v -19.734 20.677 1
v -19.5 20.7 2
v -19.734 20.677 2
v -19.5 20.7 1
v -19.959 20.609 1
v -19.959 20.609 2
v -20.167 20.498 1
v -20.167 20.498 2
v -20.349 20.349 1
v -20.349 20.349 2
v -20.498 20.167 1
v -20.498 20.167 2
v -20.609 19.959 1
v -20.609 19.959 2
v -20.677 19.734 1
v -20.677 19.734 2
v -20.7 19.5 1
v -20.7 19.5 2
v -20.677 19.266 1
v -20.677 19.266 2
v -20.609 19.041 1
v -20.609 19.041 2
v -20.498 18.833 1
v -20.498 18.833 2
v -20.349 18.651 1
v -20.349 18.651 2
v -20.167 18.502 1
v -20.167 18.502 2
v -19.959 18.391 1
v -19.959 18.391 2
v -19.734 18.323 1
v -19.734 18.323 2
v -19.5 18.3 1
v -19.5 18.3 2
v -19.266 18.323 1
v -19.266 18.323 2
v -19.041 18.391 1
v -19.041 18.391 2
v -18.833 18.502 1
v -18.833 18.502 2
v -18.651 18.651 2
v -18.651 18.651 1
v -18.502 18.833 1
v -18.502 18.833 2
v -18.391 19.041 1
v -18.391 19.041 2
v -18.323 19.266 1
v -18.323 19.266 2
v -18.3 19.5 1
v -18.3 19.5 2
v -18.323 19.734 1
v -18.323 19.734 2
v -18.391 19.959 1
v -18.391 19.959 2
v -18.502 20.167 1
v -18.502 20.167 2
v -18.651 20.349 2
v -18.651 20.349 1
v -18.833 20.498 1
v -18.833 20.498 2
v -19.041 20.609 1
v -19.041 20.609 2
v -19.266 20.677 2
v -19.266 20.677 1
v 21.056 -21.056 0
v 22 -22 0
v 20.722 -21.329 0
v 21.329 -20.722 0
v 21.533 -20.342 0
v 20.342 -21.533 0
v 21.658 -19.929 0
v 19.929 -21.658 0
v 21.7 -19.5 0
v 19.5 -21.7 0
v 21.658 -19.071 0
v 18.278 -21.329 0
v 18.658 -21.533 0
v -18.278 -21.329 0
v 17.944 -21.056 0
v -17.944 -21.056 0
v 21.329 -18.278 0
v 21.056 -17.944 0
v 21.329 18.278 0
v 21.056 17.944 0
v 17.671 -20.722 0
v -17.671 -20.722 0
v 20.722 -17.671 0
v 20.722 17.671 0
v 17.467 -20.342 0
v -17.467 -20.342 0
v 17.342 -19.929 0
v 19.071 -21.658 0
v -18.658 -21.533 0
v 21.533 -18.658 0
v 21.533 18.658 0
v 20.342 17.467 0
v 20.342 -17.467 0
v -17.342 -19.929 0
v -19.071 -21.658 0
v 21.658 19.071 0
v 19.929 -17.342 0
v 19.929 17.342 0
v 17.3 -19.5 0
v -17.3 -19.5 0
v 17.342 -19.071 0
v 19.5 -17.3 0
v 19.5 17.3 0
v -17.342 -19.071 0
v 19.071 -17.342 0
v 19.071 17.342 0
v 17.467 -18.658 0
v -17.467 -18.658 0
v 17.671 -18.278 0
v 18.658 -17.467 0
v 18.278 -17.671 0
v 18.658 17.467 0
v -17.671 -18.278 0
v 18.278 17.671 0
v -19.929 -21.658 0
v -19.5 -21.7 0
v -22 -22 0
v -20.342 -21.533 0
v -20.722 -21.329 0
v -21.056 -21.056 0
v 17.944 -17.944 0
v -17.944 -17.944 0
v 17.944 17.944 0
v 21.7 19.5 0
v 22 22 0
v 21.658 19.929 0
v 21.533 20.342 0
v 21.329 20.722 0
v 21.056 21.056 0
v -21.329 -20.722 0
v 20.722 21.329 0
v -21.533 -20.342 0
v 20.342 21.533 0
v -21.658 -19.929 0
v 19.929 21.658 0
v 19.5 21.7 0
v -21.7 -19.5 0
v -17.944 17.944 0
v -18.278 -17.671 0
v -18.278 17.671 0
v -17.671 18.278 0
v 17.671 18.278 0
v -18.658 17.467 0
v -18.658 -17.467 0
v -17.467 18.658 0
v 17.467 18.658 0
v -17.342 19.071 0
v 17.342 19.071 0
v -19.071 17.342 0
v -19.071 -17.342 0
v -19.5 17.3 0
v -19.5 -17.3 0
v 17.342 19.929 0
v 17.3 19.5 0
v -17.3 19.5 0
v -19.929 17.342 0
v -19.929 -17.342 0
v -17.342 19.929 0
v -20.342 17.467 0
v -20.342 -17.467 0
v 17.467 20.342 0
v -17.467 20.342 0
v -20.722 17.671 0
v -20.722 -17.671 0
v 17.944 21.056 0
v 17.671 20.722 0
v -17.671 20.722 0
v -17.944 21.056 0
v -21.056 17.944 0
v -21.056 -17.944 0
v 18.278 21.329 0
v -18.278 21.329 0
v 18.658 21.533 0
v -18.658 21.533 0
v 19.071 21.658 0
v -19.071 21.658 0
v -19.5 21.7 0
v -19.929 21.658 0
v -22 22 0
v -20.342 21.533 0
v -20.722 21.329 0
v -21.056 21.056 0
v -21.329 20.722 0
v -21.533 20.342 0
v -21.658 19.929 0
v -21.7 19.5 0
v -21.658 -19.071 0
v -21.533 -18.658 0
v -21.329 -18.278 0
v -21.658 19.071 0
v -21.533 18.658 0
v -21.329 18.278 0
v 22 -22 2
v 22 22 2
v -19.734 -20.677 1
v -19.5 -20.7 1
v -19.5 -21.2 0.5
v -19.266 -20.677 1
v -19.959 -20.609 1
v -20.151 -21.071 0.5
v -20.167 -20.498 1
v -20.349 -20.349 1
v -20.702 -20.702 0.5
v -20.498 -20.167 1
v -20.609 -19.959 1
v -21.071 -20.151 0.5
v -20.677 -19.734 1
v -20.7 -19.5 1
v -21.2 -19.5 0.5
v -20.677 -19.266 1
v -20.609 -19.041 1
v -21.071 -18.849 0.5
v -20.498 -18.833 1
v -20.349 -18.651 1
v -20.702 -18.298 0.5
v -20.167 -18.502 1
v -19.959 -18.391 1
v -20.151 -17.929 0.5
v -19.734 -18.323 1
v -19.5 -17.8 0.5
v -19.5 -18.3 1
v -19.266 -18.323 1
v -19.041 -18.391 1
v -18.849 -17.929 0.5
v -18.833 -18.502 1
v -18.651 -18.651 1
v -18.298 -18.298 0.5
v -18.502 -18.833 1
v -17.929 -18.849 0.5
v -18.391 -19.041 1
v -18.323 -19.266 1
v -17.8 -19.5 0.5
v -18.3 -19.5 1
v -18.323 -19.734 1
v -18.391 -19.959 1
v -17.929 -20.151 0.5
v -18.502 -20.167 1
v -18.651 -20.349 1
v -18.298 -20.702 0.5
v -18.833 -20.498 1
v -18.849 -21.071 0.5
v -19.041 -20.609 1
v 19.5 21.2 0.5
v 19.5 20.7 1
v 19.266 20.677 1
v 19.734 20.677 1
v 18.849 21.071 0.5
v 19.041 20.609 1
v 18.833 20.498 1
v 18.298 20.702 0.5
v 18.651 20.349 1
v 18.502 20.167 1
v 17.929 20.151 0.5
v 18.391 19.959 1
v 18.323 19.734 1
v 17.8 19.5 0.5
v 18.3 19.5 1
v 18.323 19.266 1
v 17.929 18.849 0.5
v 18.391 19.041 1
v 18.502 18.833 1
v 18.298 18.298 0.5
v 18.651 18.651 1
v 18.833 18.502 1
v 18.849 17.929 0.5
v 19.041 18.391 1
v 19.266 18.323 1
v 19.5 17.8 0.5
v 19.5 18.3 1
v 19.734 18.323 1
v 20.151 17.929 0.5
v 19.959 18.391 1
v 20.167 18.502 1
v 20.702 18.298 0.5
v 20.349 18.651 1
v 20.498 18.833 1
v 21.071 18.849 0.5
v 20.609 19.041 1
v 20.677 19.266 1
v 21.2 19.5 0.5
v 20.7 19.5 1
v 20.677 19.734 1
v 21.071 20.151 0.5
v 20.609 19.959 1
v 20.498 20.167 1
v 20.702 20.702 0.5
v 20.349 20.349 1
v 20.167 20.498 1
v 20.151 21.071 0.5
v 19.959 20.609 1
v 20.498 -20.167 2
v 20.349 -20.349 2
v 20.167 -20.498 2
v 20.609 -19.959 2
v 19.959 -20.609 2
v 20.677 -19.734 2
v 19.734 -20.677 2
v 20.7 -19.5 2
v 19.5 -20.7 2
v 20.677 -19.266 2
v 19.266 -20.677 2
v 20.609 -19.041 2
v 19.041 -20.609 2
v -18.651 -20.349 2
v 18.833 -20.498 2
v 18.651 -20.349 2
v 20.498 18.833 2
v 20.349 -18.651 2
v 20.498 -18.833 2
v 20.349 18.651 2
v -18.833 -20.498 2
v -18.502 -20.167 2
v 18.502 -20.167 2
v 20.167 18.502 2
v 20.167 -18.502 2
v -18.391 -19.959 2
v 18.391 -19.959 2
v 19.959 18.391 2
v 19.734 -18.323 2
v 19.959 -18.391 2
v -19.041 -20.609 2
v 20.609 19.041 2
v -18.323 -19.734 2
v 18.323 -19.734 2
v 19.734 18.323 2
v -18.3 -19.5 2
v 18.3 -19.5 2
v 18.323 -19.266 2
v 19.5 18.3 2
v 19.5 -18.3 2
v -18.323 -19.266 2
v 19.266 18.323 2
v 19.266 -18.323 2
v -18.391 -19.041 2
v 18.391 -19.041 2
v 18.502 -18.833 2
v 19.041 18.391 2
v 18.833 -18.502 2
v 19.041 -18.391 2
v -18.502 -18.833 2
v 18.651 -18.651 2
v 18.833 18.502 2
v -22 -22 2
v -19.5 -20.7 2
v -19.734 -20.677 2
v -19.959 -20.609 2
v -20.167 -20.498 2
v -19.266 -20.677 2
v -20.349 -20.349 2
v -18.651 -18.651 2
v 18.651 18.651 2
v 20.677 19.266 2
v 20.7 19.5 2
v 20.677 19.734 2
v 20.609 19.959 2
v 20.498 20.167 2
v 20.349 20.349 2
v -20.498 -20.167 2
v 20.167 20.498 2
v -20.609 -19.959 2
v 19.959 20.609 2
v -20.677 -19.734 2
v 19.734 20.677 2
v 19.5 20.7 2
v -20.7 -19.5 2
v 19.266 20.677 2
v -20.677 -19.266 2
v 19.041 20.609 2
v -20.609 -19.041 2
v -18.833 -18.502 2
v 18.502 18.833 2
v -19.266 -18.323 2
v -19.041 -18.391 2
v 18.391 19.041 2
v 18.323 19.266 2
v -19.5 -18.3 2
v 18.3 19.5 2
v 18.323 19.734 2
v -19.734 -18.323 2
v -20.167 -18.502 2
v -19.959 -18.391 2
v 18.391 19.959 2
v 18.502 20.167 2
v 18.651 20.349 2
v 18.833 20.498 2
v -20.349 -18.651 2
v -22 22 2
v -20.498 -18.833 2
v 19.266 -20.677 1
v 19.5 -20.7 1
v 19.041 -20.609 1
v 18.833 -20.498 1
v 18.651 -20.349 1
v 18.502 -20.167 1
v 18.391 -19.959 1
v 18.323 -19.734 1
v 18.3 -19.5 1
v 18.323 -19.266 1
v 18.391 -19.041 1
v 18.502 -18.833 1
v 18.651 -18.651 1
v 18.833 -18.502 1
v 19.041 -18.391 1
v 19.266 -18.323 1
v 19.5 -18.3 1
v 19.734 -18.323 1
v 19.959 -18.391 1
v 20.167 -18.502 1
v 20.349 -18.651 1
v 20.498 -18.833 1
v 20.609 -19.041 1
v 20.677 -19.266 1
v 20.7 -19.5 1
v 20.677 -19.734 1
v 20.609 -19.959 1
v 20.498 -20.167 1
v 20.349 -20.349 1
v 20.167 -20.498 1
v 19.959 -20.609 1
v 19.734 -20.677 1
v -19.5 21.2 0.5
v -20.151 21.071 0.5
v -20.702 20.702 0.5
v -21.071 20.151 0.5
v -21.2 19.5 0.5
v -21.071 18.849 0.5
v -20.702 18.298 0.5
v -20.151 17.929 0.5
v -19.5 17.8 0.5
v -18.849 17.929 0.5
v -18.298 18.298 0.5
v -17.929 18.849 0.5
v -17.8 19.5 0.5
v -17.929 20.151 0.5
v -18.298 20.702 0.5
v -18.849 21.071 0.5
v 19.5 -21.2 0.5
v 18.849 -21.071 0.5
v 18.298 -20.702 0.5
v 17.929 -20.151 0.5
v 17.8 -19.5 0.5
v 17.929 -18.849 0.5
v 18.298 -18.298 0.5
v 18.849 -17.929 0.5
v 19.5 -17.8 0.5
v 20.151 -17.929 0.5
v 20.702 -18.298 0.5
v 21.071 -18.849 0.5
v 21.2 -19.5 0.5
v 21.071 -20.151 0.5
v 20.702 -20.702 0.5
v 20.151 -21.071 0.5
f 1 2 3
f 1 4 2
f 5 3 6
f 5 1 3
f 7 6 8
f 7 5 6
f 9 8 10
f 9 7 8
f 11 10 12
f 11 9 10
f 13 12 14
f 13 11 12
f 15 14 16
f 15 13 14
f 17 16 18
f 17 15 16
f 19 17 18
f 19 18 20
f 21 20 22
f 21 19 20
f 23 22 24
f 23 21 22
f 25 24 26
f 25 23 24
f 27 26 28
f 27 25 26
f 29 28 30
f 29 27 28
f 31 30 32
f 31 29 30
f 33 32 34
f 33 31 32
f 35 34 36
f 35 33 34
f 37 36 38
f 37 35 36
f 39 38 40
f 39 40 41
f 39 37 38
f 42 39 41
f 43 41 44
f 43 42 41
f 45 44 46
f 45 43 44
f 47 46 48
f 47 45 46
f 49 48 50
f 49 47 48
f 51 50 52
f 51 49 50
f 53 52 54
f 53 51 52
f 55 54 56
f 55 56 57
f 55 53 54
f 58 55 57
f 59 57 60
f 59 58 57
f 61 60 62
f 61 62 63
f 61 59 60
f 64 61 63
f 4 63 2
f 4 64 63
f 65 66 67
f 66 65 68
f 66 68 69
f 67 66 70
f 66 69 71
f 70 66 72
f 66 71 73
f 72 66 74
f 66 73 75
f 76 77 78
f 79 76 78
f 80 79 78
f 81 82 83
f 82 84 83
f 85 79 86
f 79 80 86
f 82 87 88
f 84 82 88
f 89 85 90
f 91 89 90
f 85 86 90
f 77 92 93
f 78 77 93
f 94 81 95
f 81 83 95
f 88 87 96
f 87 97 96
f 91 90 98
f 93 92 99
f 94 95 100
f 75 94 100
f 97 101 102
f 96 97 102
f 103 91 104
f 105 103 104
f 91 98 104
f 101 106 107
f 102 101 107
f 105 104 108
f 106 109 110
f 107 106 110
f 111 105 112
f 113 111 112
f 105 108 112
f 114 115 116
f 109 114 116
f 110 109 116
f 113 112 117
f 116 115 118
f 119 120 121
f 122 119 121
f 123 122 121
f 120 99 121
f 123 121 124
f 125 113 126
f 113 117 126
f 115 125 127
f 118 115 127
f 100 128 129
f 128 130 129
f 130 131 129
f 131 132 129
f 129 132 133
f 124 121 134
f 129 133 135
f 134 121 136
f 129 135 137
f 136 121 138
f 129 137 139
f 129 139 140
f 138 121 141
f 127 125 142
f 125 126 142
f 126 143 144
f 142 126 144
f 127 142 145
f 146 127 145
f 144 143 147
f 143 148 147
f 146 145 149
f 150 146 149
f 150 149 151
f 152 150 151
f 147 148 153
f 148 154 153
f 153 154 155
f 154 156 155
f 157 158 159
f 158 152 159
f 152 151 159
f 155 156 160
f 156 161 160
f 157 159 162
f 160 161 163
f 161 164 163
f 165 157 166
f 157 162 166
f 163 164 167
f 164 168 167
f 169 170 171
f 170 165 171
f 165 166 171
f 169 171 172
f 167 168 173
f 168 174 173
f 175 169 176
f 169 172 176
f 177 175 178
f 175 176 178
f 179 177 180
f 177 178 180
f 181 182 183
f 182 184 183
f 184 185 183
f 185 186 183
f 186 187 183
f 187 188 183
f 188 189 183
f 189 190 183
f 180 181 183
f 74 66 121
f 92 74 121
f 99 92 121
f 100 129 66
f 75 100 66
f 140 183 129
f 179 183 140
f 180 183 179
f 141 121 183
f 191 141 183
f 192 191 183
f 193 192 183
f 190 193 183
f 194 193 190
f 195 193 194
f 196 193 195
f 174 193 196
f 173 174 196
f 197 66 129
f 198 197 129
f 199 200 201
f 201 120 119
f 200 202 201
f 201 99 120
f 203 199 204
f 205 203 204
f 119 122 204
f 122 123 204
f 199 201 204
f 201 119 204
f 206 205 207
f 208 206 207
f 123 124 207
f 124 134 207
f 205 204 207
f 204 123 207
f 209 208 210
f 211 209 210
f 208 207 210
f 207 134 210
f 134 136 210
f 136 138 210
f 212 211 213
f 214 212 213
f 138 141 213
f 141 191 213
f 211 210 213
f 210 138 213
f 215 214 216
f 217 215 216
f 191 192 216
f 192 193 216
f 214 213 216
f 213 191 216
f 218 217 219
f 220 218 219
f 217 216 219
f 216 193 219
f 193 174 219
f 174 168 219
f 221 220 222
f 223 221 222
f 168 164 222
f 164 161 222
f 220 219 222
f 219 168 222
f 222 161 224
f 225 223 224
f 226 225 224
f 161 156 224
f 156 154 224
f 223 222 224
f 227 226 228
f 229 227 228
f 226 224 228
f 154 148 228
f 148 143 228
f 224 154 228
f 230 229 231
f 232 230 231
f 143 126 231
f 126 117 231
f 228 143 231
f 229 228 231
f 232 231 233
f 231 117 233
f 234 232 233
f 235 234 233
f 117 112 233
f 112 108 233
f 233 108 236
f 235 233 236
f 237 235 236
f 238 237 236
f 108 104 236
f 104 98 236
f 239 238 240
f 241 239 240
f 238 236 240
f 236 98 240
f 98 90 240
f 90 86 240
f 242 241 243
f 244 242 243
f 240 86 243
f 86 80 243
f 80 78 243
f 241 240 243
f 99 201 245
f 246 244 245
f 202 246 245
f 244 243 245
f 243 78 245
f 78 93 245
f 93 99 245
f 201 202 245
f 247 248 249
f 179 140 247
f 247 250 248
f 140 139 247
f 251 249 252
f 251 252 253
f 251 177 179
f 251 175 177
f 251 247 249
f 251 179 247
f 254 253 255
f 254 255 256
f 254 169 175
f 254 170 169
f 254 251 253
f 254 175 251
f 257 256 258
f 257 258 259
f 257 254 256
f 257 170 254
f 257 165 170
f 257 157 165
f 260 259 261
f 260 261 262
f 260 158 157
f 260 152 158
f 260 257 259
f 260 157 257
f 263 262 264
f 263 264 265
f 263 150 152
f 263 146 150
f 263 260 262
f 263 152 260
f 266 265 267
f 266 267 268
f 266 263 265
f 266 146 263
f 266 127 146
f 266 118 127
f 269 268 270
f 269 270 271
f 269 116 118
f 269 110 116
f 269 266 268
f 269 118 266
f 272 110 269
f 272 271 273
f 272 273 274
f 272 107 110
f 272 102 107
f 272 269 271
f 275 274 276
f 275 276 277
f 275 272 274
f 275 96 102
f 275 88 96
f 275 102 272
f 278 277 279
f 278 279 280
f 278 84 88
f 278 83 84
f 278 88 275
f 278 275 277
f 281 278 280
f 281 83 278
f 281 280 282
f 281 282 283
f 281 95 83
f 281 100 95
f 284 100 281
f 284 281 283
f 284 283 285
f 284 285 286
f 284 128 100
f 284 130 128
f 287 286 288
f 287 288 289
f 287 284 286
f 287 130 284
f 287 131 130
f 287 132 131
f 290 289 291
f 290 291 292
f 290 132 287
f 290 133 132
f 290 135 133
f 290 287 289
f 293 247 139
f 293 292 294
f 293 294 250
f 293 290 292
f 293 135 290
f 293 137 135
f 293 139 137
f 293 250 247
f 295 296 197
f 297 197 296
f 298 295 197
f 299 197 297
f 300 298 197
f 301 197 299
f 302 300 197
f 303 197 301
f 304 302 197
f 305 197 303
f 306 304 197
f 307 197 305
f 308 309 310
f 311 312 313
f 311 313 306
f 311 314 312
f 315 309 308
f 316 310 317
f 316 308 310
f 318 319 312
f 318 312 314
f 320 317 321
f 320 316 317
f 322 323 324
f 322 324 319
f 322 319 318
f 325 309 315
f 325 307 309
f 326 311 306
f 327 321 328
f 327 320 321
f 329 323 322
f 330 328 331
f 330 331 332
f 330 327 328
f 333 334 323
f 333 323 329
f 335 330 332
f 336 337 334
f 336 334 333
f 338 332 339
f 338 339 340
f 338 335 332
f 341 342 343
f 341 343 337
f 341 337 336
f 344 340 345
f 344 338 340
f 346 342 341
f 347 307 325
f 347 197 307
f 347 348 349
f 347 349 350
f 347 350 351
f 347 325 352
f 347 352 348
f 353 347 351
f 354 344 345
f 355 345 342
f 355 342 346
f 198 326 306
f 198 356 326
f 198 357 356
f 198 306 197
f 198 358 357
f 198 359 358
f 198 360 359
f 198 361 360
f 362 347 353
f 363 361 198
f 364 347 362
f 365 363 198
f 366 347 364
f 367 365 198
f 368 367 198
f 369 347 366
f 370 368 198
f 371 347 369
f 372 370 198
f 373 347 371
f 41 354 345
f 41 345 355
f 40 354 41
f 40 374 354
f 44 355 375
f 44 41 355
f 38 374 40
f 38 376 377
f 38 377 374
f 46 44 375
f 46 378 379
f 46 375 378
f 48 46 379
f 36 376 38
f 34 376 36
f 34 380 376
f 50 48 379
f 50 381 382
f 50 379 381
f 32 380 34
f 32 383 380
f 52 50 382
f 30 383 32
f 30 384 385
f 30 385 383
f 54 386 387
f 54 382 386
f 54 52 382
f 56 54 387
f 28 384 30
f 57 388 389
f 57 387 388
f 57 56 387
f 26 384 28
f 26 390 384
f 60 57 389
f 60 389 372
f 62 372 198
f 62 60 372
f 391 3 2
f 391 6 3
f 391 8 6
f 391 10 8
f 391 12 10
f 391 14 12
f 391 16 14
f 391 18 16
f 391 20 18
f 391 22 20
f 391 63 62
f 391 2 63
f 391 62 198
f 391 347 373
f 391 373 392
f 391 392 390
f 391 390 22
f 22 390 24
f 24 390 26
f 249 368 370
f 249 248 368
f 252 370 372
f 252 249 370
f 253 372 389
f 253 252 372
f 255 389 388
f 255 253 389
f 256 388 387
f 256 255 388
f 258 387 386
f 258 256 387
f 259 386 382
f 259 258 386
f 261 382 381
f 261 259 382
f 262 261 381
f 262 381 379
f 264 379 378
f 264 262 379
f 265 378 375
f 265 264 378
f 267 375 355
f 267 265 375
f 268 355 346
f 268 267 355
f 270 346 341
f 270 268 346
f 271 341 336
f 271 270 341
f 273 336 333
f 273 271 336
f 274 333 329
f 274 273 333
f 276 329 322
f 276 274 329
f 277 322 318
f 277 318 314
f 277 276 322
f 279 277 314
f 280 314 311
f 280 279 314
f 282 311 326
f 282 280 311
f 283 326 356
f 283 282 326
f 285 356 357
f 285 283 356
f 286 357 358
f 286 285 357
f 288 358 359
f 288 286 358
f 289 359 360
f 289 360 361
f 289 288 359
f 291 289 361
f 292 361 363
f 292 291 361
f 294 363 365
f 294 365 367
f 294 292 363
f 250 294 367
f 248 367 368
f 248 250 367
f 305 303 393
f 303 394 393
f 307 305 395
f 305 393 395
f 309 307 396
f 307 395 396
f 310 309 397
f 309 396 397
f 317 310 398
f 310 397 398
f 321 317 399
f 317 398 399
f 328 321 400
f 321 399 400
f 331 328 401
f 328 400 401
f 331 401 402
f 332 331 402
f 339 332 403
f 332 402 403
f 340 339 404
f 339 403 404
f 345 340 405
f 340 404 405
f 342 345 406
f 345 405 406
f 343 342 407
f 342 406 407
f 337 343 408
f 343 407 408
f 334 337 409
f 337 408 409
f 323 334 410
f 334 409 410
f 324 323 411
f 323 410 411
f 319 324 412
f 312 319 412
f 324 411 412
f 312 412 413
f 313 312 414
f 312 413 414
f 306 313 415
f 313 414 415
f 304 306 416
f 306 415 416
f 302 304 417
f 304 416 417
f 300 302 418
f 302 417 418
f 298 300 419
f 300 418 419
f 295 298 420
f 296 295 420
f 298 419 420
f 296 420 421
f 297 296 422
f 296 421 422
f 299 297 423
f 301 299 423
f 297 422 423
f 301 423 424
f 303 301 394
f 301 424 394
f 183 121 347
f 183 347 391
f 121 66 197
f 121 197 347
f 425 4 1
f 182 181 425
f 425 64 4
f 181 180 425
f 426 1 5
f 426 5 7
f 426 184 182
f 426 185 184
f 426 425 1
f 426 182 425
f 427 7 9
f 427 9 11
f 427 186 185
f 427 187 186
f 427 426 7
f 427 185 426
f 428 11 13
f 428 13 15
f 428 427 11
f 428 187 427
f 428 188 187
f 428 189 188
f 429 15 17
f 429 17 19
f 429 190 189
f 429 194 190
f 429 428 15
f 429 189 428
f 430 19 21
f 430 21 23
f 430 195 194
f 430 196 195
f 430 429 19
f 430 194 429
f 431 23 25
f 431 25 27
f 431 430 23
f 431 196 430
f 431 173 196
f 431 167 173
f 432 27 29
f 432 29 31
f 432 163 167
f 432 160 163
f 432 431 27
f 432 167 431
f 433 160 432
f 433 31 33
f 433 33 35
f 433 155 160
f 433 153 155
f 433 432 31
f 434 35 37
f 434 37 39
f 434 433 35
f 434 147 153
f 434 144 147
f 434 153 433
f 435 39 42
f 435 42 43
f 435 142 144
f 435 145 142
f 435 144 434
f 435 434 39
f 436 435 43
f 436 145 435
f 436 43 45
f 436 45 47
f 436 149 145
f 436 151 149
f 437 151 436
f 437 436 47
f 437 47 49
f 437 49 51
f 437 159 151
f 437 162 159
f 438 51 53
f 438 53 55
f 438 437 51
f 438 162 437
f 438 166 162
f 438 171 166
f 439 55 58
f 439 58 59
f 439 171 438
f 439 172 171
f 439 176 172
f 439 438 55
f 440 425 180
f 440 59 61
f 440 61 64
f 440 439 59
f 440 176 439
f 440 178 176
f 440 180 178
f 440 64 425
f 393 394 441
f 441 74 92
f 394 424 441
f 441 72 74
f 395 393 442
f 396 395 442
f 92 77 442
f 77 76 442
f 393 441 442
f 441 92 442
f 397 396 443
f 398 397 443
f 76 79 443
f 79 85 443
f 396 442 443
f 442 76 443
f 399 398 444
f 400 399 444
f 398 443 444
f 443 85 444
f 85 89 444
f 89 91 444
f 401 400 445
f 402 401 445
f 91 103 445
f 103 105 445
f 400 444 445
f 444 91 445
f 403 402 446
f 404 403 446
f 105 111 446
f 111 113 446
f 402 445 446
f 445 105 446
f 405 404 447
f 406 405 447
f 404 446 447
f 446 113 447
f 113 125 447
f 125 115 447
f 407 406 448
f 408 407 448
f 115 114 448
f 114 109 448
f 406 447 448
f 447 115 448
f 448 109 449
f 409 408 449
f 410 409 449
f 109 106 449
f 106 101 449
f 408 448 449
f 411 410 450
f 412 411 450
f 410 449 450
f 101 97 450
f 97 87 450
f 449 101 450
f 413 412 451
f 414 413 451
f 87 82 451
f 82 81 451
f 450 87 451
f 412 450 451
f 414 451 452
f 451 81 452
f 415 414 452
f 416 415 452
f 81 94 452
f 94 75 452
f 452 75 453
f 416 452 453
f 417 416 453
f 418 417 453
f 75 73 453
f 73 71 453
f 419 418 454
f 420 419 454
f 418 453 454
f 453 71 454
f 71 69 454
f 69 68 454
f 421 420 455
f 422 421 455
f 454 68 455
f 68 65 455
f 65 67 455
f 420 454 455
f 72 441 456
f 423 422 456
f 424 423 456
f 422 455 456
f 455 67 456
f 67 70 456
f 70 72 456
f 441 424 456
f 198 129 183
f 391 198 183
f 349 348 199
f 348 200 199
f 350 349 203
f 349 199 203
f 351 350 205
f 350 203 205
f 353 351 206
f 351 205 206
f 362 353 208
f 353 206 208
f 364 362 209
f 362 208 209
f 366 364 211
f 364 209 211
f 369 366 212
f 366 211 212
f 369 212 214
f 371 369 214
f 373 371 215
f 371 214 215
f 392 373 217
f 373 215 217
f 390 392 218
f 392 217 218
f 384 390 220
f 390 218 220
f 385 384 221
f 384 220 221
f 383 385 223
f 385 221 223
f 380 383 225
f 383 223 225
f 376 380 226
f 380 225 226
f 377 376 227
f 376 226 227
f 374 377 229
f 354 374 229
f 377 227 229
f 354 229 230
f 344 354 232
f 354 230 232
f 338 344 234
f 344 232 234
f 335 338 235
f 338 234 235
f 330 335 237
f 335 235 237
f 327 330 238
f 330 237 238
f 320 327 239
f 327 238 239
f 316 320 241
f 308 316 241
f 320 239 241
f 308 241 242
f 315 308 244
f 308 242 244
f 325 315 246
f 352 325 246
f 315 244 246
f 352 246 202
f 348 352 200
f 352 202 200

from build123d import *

# Parameters (mm, degrees)
ESQUISSE1_W                                 = 44
ESQUISSE1_H                                 = 44
BOSS_EXTRU_1_DEPTH                          = 2
FRAISAGE_POUR_VIS_T_TE_FRAIS_E_M21_AT_COUNT = 2
FRAISAGE_POUR_VIS_T_TE_FRAIS_E_M21_AT_PITCH = 39


with BuildPart() as part:
    # Esquisse1 → Boss.-Extru.1 (new body)
    with BuildSketch(Plane(origin=(0, 0, 0), x_dir=(0, 1, 0), z_dir=(0, 0, 1))):
        Rectangle(ESQUISSE1_W, ESQUISSE1_H)
    extrude(amount=BOSS_EXTRU_1_DEPTH)

    # Esquisse3 → Fraisage pour vis à tête fraisée M21 (revolve, cut)
    with BuildSketch(Plane(origin=(19.5, 19.5, 0), x_dir=(0, 1, 0), z_dir=(1, 0, 0))):
        Polygon((0, 0), (0, 2), (1.2, 2), (1.2, 1), (2.2, 0), align=None)
    fraisage_pour_vis_t_te_frais_e_m21 = revolve(axis=Axis((19.5, 19.5, -6.35), (0, 0, 1)), mode=Mode.SUBTRACT)

    # Fraisage pour vis à tête fraisée M21 at: Fraisage pour vis à tête fraisée M21 ×2
    with Locations(*[(-i * FRAISAGE_POUR_VIS_T_TE_FRAIS_E_M21_AT_PITCH, 0, 0) for i in range(1, FRAISAGE_POUR_VIS_T_TE_FRAIS_E_M21_AT_COUNT)]):
        add(fraisage_pour_vis_t_te_frais_e_m21, mode=Mode.SUBTRACT)

    # Symétrie2: Fraisage pour vis à tête fraisée M21 across plane
    add(fraisage_pour_vis_t_te_frais_e_m21.mirror(Plane.ZX), mode=Mode.SUBTRACT)

    # Symétrie2 copy 1 sketch → Symétrie2 copy 1 (revolve, cut)
    with BuildSketch(Plane(origin=(-19.5, -19.5, 0), x_dir=(0, -1, 0), z_dir=(1, 0, 0))):
        Polygon((0, 0), (0, -2), (1.2, -2), (1.2, -1), (2.2, 0), align=None)
    revolve(axis=Axis((-19.5, -19.5, -6.35), (0, 0, -1)), mode=Mode.SUBTRACT)


solid = part.part
